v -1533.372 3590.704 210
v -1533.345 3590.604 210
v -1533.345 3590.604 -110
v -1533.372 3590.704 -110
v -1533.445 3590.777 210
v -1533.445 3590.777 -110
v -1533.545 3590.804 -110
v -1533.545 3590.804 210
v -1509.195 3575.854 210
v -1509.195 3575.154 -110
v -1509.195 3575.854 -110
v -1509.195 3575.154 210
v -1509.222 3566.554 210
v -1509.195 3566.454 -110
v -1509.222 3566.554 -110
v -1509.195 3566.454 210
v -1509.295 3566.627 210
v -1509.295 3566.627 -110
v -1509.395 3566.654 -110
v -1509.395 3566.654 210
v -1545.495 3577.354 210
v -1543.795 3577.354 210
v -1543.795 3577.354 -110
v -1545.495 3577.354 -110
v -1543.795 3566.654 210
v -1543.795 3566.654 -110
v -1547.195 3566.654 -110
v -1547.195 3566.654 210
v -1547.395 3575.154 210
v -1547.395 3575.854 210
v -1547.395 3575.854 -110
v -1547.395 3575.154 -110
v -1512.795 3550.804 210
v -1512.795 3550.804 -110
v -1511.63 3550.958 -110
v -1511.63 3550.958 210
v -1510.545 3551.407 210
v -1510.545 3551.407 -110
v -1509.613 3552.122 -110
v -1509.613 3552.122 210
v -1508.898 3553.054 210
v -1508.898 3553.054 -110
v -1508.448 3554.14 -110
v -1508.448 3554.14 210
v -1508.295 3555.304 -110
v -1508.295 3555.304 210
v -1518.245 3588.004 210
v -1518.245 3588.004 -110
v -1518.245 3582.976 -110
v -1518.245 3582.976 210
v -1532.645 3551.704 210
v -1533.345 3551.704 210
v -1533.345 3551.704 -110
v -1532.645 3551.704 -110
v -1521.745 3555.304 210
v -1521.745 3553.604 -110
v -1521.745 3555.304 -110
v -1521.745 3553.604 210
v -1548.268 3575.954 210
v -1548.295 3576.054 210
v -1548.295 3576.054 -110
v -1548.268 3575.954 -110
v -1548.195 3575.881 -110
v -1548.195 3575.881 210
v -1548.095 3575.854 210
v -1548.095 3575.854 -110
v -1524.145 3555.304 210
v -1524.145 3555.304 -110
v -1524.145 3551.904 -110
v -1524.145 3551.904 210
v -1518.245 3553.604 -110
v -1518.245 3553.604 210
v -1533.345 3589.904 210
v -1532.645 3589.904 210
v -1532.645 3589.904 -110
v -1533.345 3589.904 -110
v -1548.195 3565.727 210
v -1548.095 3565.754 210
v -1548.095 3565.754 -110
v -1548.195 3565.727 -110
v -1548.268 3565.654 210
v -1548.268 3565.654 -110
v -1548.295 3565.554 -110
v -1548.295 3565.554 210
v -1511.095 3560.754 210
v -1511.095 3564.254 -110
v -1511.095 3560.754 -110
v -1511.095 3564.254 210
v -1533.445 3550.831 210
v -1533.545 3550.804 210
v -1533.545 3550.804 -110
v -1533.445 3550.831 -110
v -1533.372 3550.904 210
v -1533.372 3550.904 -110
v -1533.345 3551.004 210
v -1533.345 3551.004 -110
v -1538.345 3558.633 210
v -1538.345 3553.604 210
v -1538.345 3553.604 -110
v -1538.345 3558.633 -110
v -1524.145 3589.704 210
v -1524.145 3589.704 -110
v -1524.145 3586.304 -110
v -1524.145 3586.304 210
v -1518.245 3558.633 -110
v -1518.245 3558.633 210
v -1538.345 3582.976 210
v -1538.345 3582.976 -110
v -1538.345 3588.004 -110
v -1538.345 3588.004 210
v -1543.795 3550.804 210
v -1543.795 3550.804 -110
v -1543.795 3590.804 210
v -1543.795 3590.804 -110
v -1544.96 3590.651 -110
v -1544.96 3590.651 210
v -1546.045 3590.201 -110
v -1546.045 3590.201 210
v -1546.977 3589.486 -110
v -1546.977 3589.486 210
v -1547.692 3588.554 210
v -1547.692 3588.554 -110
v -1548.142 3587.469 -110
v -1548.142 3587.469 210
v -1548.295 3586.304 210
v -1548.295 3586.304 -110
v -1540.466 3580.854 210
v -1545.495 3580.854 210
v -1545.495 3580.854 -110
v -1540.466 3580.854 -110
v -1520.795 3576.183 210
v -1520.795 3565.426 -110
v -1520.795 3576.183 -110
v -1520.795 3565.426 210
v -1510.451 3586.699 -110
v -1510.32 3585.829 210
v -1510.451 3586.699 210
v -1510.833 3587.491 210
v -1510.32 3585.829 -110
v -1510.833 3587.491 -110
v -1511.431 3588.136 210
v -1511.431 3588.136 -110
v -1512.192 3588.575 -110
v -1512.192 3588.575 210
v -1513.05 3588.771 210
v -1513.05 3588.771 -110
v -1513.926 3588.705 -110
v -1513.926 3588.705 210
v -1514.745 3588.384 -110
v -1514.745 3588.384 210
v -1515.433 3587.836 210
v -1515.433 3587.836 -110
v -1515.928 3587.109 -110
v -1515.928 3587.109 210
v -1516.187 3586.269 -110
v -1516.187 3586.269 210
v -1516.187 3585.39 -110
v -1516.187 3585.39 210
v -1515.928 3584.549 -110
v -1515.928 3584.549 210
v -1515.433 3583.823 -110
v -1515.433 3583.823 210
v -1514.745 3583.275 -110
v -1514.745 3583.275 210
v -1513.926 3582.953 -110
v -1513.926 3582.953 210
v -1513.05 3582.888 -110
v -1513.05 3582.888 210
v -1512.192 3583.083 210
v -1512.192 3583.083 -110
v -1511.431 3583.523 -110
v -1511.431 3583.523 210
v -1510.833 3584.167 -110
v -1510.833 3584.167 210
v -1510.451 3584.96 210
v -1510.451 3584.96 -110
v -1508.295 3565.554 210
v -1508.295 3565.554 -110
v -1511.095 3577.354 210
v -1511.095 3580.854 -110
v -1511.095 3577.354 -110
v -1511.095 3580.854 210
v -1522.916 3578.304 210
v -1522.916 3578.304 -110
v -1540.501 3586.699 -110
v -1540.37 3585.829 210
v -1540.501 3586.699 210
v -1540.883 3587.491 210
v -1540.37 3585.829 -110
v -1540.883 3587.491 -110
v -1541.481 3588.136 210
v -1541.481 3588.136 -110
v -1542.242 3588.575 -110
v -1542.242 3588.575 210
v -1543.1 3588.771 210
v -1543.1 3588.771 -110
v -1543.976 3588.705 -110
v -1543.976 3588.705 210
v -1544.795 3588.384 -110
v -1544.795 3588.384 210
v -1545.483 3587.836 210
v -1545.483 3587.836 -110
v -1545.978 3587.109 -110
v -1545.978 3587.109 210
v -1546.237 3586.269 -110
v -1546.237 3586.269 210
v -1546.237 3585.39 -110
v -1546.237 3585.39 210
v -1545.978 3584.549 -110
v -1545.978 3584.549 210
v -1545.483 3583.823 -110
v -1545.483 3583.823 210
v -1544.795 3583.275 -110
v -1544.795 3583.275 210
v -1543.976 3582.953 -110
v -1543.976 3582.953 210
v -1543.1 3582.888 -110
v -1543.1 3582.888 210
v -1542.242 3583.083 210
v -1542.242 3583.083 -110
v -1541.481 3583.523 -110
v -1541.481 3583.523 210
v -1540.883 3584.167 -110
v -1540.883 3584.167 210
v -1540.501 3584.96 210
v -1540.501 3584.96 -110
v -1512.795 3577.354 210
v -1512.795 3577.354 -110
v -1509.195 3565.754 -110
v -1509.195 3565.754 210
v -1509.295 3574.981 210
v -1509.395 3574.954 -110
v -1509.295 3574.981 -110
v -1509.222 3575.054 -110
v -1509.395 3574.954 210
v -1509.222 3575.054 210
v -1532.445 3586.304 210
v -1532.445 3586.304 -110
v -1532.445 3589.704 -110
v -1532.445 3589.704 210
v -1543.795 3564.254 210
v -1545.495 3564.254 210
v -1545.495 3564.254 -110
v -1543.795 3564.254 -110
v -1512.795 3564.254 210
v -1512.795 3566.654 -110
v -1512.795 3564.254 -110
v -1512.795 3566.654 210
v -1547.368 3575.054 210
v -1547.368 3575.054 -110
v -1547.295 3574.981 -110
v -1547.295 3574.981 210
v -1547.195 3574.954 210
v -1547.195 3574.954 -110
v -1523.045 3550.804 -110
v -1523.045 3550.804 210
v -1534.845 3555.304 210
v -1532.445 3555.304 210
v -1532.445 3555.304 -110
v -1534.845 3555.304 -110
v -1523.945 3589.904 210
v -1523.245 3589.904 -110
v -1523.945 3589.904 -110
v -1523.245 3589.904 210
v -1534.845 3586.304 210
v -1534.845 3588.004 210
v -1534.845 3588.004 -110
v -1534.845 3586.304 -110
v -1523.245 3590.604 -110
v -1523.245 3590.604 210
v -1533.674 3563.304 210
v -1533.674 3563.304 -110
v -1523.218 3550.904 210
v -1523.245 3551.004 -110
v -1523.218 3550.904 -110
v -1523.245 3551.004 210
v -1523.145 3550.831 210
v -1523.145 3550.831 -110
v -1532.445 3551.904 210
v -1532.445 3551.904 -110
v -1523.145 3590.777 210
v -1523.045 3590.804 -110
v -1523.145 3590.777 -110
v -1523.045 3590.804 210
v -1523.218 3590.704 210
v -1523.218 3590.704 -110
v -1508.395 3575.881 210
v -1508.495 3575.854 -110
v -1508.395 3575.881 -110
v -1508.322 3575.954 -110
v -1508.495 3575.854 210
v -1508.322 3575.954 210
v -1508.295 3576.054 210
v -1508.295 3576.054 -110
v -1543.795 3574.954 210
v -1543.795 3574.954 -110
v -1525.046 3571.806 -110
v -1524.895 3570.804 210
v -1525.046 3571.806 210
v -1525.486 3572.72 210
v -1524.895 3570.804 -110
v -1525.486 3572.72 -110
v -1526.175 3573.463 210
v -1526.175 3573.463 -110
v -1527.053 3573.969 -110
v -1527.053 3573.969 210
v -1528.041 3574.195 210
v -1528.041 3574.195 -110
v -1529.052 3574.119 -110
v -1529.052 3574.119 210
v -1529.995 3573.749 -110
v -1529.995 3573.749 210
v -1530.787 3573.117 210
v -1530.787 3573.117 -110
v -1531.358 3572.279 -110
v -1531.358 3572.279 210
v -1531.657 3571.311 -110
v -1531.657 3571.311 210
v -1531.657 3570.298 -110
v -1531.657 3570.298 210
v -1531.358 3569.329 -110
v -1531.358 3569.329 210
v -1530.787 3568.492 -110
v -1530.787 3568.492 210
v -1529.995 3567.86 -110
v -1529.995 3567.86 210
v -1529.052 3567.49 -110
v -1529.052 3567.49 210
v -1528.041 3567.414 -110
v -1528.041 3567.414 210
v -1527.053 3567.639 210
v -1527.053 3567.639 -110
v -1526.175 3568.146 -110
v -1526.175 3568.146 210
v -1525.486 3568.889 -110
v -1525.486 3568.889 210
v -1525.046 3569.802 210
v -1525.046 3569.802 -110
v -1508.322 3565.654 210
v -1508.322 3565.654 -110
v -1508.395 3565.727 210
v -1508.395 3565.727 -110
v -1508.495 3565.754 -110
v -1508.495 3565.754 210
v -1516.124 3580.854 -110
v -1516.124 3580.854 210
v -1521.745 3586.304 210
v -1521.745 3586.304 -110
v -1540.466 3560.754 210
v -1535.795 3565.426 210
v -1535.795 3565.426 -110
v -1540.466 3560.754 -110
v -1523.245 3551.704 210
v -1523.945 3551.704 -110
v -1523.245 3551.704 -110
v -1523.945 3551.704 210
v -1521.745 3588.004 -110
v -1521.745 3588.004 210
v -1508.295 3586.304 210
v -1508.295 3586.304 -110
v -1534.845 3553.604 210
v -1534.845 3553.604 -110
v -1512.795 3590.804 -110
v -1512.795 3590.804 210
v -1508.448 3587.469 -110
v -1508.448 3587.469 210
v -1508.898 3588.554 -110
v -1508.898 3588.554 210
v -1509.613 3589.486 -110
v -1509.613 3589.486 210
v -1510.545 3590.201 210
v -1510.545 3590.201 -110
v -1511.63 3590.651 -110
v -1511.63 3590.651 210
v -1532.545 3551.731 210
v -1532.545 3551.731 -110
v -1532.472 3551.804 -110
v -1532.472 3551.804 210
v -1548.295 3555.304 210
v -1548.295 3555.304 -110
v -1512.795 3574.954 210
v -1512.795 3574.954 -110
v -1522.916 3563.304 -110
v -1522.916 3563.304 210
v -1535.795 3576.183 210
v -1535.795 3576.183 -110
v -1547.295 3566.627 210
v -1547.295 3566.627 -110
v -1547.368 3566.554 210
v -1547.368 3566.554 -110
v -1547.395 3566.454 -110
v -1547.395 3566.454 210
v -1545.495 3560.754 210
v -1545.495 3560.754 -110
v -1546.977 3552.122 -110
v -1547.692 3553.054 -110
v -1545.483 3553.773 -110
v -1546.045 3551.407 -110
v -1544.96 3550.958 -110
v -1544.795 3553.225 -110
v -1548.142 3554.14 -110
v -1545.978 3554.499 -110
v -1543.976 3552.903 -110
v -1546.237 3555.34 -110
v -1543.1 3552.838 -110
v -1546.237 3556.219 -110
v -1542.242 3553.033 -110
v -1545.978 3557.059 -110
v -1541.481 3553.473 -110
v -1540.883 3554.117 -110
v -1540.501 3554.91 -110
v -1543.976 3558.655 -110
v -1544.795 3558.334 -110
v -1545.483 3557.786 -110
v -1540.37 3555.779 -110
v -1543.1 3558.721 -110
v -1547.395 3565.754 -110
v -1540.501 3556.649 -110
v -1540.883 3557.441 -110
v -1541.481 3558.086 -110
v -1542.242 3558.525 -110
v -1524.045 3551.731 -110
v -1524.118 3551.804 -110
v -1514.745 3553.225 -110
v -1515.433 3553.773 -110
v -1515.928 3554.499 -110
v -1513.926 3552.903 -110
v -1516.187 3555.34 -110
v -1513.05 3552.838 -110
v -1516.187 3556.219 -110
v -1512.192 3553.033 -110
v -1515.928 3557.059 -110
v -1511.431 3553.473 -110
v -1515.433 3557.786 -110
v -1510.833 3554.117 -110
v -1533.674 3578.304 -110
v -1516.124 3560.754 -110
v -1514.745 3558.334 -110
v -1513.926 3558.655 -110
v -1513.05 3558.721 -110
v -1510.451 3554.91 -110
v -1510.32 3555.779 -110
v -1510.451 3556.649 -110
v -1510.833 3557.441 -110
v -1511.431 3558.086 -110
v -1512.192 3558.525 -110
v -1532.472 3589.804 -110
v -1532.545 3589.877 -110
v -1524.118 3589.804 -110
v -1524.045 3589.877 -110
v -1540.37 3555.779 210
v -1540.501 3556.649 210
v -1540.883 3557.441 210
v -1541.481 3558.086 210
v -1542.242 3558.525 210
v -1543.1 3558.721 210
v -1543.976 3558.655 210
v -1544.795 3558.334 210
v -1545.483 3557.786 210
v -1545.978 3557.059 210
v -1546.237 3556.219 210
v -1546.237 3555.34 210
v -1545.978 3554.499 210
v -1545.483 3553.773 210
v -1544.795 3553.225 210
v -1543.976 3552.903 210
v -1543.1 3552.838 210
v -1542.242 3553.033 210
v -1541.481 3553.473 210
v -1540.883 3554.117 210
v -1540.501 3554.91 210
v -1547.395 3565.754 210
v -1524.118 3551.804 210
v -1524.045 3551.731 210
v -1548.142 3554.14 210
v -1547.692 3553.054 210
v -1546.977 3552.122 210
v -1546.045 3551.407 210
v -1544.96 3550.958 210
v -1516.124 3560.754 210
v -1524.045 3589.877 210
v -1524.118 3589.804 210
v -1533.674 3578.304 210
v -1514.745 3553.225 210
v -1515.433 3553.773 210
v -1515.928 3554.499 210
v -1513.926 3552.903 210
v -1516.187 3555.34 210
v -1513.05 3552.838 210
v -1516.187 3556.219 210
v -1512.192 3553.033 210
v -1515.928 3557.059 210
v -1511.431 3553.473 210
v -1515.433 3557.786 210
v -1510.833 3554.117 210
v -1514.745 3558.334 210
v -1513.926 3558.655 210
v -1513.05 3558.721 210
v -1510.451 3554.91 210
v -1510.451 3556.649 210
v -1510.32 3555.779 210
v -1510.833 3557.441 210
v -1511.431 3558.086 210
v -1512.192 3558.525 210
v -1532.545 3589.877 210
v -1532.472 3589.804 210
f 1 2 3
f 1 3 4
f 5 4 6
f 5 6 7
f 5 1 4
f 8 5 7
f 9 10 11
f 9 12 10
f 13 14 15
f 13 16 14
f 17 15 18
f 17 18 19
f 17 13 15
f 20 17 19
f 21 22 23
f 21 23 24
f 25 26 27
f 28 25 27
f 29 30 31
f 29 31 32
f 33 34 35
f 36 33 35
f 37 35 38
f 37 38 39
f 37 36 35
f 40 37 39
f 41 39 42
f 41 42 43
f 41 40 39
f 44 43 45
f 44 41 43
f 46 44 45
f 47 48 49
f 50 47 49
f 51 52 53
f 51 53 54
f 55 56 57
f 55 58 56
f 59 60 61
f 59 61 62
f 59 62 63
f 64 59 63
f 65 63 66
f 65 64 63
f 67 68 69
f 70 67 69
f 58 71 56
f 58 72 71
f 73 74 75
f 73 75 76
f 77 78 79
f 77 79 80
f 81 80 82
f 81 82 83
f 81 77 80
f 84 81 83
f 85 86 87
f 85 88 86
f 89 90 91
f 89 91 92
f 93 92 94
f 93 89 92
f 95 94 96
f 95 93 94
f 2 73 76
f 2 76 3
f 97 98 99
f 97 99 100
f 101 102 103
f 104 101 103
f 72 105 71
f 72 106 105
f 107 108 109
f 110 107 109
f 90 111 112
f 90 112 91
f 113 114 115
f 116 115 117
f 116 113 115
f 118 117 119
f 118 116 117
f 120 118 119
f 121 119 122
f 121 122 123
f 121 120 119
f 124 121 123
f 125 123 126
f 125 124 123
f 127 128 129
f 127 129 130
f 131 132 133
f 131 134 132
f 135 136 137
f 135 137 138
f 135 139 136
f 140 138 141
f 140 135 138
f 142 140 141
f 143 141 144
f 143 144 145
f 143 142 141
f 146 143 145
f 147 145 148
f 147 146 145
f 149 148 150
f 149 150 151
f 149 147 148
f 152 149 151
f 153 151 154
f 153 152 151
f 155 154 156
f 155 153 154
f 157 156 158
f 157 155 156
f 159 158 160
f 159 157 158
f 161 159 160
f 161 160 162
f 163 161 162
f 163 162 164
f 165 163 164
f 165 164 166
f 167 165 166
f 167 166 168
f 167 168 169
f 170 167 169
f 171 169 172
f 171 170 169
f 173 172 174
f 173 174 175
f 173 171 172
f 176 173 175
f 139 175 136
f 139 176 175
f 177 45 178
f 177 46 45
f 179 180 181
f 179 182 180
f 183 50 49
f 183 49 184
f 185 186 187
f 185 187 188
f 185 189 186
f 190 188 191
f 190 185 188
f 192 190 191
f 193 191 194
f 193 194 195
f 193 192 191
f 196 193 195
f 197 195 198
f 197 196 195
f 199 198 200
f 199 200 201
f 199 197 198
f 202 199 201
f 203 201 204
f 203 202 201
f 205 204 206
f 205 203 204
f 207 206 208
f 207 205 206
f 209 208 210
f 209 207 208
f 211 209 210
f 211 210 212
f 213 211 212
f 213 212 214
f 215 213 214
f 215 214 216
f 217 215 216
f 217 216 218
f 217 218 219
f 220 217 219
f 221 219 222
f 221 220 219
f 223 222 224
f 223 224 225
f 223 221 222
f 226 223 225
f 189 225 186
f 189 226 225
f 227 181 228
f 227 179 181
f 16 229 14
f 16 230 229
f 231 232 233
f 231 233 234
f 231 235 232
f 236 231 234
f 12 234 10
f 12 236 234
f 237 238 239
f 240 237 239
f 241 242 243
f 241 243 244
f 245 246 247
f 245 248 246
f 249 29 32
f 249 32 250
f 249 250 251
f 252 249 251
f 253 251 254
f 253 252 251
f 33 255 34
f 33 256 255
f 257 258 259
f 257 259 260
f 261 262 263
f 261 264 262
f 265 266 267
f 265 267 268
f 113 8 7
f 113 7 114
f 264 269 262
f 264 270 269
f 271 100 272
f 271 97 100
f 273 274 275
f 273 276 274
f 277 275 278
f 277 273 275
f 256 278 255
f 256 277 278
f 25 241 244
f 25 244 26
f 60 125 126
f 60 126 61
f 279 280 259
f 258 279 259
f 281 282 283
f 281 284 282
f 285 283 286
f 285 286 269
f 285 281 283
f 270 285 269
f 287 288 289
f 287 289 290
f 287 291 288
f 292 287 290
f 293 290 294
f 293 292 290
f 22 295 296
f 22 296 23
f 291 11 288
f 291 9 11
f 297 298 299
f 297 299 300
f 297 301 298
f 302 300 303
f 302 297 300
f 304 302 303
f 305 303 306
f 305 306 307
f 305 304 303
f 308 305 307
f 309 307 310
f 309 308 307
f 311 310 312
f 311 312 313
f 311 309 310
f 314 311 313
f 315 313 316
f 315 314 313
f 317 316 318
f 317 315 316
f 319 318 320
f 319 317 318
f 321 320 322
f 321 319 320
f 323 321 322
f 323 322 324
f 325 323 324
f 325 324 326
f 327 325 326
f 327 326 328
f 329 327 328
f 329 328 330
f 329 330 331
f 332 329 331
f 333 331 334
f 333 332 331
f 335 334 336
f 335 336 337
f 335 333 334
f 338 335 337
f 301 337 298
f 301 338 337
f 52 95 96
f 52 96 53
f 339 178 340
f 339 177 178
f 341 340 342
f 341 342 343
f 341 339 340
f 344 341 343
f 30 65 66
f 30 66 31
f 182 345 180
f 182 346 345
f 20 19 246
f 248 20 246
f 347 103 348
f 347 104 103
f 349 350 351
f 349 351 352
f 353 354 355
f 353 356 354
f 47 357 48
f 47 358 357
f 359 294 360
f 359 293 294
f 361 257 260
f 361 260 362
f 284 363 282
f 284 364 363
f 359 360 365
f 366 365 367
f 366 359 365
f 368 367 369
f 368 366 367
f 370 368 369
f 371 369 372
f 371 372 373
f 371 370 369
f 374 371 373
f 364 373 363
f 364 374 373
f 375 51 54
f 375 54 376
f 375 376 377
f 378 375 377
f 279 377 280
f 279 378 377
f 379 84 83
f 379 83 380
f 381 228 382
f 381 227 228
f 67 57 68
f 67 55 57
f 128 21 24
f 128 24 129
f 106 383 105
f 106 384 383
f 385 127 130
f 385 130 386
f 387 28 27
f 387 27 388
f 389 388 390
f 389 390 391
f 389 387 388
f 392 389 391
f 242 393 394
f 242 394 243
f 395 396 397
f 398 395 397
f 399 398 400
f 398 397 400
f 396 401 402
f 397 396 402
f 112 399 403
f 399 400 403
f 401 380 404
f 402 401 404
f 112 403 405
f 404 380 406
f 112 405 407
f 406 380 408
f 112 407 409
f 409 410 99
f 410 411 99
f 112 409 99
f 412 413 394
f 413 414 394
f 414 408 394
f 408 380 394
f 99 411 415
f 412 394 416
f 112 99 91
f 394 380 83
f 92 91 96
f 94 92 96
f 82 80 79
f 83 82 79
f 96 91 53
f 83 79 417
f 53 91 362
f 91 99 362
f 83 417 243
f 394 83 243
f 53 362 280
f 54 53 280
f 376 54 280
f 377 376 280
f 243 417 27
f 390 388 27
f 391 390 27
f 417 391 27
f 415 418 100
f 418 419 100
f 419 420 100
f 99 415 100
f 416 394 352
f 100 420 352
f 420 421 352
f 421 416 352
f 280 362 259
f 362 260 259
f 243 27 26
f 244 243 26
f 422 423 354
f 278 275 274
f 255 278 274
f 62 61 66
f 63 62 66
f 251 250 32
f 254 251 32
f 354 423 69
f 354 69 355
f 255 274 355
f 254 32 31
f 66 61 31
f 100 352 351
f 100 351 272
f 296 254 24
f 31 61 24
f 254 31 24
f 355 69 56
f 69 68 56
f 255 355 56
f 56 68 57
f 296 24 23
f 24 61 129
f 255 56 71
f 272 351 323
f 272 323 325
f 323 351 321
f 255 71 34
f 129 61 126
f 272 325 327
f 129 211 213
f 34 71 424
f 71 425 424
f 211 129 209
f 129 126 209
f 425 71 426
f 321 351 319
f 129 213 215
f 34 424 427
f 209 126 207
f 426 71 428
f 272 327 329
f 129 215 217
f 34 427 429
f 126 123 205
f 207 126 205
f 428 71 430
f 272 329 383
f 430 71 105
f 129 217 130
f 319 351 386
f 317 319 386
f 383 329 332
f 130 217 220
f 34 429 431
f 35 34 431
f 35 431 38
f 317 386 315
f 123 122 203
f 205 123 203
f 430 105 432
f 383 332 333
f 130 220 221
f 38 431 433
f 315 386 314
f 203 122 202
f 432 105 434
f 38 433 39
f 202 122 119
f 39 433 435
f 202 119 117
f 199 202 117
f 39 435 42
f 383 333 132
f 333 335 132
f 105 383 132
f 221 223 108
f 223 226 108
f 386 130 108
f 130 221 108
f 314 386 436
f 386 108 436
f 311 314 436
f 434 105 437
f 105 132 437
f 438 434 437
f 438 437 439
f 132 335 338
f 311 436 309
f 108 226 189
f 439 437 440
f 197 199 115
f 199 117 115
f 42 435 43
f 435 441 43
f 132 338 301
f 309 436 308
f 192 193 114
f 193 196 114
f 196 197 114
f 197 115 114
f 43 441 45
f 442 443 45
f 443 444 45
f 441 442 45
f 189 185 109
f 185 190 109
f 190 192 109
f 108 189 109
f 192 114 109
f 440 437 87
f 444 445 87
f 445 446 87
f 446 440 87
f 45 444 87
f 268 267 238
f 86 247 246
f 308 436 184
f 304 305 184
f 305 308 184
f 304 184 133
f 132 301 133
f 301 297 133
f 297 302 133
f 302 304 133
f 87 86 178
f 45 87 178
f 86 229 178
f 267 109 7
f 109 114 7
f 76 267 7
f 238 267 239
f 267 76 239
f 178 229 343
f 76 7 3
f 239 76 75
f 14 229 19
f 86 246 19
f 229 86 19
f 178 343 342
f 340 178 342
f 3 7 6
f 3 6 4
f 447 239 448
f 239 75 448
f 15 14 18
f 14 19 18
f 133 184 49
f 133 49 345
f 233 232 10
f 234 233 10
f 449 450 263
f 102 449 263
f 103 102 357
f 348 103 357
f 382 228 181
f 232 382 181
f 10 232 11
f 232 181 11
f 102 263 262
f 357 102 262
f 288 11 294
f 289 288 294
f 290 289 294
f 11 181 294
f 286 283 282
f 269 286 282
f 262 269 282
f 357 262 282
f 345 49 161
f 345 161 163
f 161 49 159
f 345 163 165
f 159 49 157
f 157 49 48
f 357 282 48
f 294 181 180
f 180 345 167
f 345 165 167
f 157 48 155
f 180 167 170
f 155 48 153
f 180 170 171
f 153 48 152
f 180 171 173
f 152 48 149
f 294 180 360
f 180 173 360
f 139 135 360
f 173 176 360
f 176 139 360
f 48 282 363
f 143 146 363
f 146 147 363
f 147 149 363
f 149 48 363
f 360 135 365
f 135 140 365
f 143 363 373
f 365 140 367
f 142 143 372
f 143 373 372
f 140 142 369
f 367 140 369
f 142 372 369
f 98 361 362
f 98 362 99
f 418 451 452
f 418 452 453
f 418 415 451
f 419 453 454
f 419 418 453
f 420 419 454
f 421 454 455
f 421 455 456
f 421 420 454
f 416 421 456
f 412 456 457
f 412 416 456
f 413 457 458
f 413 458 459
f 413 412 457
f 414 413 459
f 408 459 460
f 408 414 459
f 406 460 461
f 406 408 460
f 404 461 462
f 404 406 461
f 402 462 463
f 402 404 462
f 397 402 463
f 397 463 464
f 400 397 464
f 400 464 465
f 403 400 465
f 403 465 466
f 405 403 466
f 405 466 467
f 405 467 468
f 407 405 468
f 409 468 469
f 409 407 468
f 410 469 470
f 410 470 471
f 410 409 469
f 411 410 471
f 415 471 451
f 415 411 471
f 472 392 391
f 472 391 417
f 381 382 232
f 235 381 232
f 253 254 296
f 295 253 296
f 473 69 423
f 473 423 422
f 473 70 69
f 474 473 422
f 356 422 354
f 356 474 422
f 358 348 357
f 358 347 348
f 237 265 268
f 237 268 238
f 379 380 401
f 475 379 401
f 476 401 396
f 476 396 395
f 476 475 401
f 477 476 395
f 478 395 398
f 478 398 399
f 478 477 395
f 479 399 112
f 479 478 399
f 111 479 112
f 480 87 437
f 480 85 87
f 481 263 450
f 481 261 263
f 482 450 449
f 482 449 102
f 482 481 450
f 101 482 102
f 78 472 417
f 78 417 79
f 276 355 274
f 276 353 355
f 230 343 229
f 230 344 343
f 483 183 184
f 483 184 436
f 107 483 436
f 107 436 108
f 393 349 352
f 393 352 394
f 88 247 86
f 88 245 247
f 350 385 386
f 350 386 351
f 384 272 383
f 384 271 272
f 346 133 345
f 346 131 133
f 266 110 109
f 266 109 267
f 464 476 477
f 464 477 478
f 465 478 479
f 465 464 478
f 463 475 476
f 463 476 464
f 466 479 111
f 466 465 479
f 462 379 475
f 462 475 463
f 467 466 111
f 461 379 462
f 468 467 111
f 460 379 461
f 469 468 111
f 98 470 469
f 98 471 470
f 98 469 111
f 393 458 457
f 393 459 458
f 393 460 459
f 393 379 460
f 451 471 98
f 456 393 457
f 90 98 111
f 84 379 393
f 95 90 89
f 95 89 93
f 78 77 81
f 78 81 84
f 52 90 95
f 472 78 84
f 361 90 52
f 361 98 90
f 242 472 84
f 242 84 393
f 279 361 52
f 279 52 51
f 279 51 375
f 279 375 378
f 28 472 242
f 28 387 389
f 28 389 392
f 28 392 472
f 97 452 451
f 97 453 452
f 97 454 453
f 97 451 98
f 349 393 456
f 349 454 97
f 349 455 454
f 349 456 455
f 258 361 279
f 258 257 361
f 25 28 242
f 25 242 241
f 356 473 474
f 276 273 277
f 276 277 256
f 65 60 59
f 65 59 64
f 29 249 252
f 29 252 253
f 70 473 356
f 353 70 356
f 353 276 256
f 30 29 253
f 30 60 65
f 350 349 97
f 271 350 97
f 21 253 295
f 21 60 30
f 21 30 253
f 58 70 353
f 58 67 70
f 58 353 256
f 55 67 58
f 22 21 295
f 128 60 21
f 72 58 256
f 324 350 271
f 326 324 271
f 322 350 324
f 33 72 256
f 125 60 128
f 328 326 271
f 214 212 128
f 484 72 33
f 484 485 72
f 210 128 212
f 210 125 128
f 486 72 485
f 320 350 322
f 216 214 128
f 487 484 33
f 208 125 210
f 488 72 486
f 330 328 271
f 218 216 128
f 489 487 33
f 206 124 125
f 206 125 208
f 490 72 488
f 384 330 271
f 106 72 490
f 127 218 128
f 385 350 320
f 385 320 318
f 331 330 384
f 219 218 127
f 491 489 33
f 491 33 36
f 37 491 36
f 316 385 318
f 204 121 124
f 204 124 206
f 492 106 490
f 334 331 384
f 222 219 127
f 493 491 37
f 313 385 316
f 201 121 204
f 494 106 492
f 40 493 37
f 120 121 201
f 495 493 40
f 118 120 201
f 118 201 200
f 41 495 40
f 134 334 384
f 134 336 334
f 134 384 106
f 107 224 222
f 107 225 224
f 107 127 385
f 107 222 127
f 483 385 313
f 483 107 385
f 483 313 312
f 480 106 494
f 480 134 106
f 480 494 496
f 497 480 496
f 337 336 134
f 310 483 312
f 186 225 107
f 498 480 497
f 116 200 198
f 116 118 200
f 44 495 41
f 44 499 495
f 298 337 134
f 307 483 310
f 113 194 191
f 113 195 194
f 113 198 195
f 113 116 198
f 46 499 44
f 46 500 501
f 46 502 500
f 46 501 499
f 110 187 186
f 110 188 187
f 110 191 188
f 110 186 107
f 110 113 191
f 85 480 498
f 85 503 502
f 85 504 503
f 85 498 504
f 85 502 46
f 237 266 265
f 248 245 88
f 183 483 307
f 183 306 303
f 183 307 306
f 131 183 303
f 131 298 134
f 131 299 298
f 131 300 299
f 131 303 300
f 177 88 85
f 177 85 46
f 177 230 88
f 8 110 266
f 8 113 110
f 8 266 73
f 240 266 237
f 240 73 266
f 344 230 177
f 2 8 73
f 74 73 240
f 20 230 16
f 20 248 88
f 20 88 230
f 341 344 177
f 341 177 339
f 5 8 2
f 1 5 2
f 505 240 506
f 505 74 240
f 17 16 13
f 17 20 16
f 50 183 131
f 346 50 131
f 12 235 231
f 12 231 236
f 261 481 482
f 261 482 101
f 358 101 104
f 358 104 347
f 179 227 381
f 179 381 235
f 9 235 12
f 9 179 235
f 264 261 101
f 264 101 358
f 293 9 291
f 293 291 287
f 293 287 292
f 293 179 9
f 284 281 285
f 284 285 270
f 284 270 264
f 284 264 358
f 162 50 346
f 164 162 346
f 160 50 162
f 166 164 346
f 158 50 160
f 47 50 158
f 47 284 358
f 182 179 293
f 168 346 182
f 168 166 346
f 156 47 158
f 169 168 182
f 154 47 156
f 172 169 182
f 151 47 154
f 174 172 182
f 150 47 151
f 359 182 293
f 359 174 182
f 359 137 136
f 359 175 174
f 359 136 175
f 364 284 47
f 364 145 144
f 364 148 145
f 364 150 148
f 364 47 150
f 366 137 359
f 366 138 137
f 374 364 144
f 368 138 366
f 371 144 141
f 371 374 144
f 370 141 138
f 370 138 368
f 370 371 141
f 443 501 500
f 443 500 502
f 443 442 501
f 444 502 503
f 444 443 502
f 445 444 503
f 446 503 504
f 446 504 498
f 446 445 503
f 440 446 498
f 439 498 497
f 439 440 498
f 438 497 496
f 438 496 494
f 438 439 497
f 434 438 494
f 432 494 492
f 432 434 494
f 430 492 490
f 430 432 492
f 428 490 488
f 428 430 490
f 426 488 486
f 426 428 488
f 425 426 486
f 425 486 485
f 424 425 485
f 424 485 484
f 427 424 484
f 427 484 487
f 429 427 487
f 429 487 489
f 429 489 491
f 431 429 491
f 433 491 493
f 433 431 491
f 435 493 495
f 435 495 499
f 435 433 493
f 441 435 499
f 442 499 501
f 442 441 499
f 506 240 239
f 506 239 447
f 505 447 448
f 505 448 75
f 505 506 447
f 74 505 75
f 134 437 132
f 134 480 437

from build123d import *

# Parameters (mm, degrees)
SKETCH_1_R      = 2.95
SKETCH_1_R_2    = 3.4
EXTRUDE_1_DEPTH = 160


with BuildPart() as part:
    # 草图1 → 凸台-拉伸1 (new body, symmetric)
    with BuildSketch(Plane.XY.offset(50)):
        with BuildLine():
            Line((-1518.245004392, 3588.004280474), (-1518.245004392, 3582.975600817))
            Line((-1518.245004392, 3582.975600817), (-1522.916324736, 3578.304280474))
            Line((-1522.916324736, 3578.304280474), (-1533.673684048, 3578.304280474))
            Line((-1533.673684048, 3578.304280474), (-1538.345004392, 3582.975600817))
            Line((-1538.345004392, 3582.975600817), (-1538.345004392, 3588.004280474))
            Line((-1538.345004392, 3588.004280474), (-1534.845004392, 3588.004280474))
            Line((-1534.845004392, 3588.004280474), (-1534.845004392, 3586.304280474))
            Line((-1534.845004392, 3586.304280474), (-1532.445004392, 3586.304280474))
            Line((-1532.445004392, 3586.304280474), (-1532.445004392, 3589.704280474))
            ThreePointArc((-1532.445004392, 3589.704280474), (-1532.503583036, 3589.84570183), (-1532.645004392, 3589.904280474))
            Line((-1532.645004392, 3589.904280474), (-1533.345004392, 3589.904280474))
            Line((-1533.345004392, 3589.904280474), (-1533.345004392, 3590.604280474))
            ThreePointArc((-1533.345004392, 3590.604280474), (-1533.403583036, 3590.74570183), (-1533.545004392, 3590.804280474))
            Line((-1533.545004392, 3590.804280474), (-1543.795004392, 3590.804280474))
            ThreePointArc((-1543.795004392, 3590.804280474), (-1546.976984907, 3589.486260989), (-1548.295004392, 3586.304280474))
            Line((-1548.295004392, 3586.304280474), (-1548.295004392, 3576.054280474))
            ThreePointArc((-1548.295004392, 3576.054280474), (-1548.236425748, 3575.912859117), (-1548.095004392, 3575.854280474))
            Line((-1548.095004392, 3575.854280474), (-1547.395004392, 3575.854280474))
            Line((-1547.395004392, 3575.854280474), (-1547.395004392, 3575.154280474))
            ThreePointArc((-1547.395004392, 3575.154280474), (-1547.336425748, 3575.012859117), (-1547.195004392, 3574.954280474))
            Line((-1547.195004392, 3574.954280474), (-1543.795004392, 3574.954280474))
            Line((-1543.795004392, 3574.954280474), (-1543.795004392, 3577.354280474))
            Line((-1543.795004392, 3577.354280474), (-1545.495004392, 3577.354280474))
            Line((-1545.495004392, 3577.354280474), (-1545.495004392, 3580.854280474))
            Line((-1545.495004392, 3580.854280474), (-1540.466324736, 3580.854280474))
            Line((-1540.466324736, 3580.854280474), (-1535.795004392, 3576.18296013))
            Line((-1535.795004392, 3576.18296013), (-1535.795004392, 3565.425600817))
            Line((-1535.795004392, 3565.425600817), (-1540.466324736, 3560.754280474))
            Line((-1540.466324736, 3560.754280474), (-1545.495004392, 3560.754280474))
            Line((-1545.495004392, 3560.754280474), (-1545.495004392, 3564.254280474))
            Line((-1545.495004392, 3564.254280474), (-1543.795004392, 3564.254280474))
            Line((-1543.795004392, 3564.254280474), (-1543.795004392, 3566.654280474))
            Line((-1543.795004392, 3566.654280474), (-1547.195004392, 3566.654280474))
            ThreePointArc((-1547.195004392, 3566.654280474), (-1547.336425748, 3566.59570183), (-1547.395004392, 3566.454280474))
            Line((-1547.395004392, 3566.454280474), (-1547.395004392, 3565.754280474))
            Line((-1547.395004392, 3565.754280474), (-1548.095004392, 3565.754280474))
            ThreePointArc((-1548.095004392, 3565.754280474), (-1548.236425748, 3565.69570183), (-1548.295004392, 3565.554280474))
            Line((-1548.295004392, 3565.554280474), (-1548.295004392, 3555.304280474))
            ThreePointArc((-1548.295004392, 3555.304280474), (-1546.976984907, 3552.122299958), (-1543.795004392, 3550.804280474))
            Line((-1543.795004392, 3550.804280474), (-1533.545004392, 3550.804280474))
            ThreePointArc((-1533.545004392, 3550.804280474), (-1533.403583036, 3550.862859117), (-1533.345004392, 3551.004280474))
            Line((-1533.345004392, 3551.004280474), (-1533.345004392, 3551.704280474))
            Line((-1533.345004392, 3551.704280474), (-1532.645004392, 3551.704280474))
            ThreePointArc((-1532.645004392, 3551.704280474), (-1532.503583036, 3551.762859117), (-1532.445004392, 3551.904280474))
            Line((-1532.445004392, 3551.904280474), (-1532.445004392, 3555.304280474))
            Line((-1532.445004392, 3555.304280474), (-1534.845004392, 3555.304280474))
            Line((-1534.845004392, 3555.304280474), (-1534.845004392, 3553.604280474))
            Line((-1534.845004392, 3553.604280474), (-1538.345004392, 3553.604280474))
            Line((-1538.345004392, 3553.604280474), (-1538.345004392, 3558.63296013))
            Line((-1538.345004392, 3558.63296013), (-1533.673684048, 3563.304280474))
            Line((-1533.673684048, 3563.304280474), (-1522.916324736, 3563.304280474))
            Line((-1522.916324736, 3563.304280474), (-1518.245004392, 3558.63296013))
            Line((-1518.245004392, 3558.63296013), (-1518.245004392, 3553.604280474))
            Line((-1518.245004392, 3553.604280474), (-1521.745004392, 3553.604280474))
            Line((-1521.745004392, 3553.604280474), (-1521.745004392, 3555.304280474))
            Line((-1521.745004392, 3555.304280474), (-1524.145004392, 3555.304280474))
            Line((-1524.145004392, 3555.304280474), (-1524.145004392, 3551.904280474))
            ThreePointArc((-1524.145004392, 3551.904280474), (-1524.086425748, 3551.762859117), (-1523.945004392, 3551.704280474))
            Line((-1523.945004392, 3551.704280474), (-1523.245004392, 3551.704280474))
            Line((-1523.245004392, 3551.704280474), (-1523.245004392, 3551.004280474))
            ThreePointArc((-1523.245004392, 3551.004280474), (-1523.186425748, 3550.862859117), (-1523.045004392, 3550.804280474))
            Line((-1523.045004392, 3550.804280474), (-1512.795004392, 3550.804280474))
            ThreePointArc((-1512.795004392, 3550.804280474), (-1509.613023877, 3552.122299958), (-1508.295004392, 3555.304280474))
            Line((-1508.295004392, 3555.304280474), (-1508.295004392, 3565.554280474))
            ThreePointArc((-1508.295004392, 3565.554280474), (-1508.353583036, 3565.69570183), (-1508.495004392, 3565.754280474))
            Line((-1508.495004392, 3565.754280474), (-1509.195004392, 3565.754280474))
            Line((-1509.195004392, 3565.754280474), (-1509.195004392, 3566.454280474))
            ThreePointArc((-1509.195004392, 3566.454280474), (-1509.253583036, 3566.59570183), (-1509.395004392, 3566.654280474))
            Line((-1509.395004392, 3566.654280474), (-1512.795004392, 3566.654280474))
            Line((-1512.795004392, 3566.654280474), (-1512.795004392, 3564.254280474))
            Line((-1512.795004392, 3564.254280474), (-1511.095004392, 3564.254280474))
            Line((-1511.095004392, 3564.254280474), (-1511.095004392, 3560.754280474))
            Line((-1511.095004392, 3560.754280474), (-1516.123684048, 3560.754280474))
            Line((-1516.123684048, 3560.754280474), (-1520.795004392, 3565.425600817))
            Line((-1520.795004392, 3565.425600817), (-1520.795004392, 3576.18296013))
            Line((-1520.795004392, 3576.18296013), (-1516.123684048, 3580.854280474))
            Line((-1516.123684048, 3580.854280474), (-1511.095004392, 3580.854280474))
            Line((-1511.095004392, 3580.854280474), (-1511.095004392, 3577.354280474))
            Line((-1511.095004392, 3577.354280474), (-1512.795004392, 3577.354280474))
            Line((-1512.795004392, 3577.354280474), (-1512.795004392, 3574.954280474))
            Line((-1512.795004392, 3574.954280474), (-1509.395004392, 3574.954280474))
            ThreePointArc((-1509.395004392, 3574.954280474), (-1509.253583036, 3575.012859117), (-1509.195004392, 3575.154280474))
            Line((-1509.195004392, 3575.154280474), (-1509.195004392, 3575.854280474))
            Line((-1509.195004392, 3575.854280474), (-1508.495004392, 3575.854280474))
            ThreePointArc((-1508.495004392, 3575.854280474), (-1508.353583036, 3575.912859117), (-1508.295004392, 3576.054280474))
            Line((-1508.295004392, 3576.054280474), (-1508.295004392, 3586.304280474))
            ThreePointArc((-1508.295004392, 3586.304280474), (-1509.613023877, 3589.486260989), (-1512.795004392, 3590.804280474))
            Line((-1512.795004392, 3590.804280474), (-1523.045004392, 3590.804280474))
            ThreePointArc((-1523.045004392, 3590.804280474), (-1523.186425748, 3590.74570183), (-1523.245004392, 3590.604280474))
            Line((-1523.245004392, 3590.604280474), (-1523.245004392, 3589.904280474))
            Line((-1523.245004392, 3589.904280474), (-1523.945004392, 3589.904280474))
            ThreePointArc((-1523.945004392, 3589.904280474), (-1524.086425748, 3589.84570183), (-1524.145004392, 3589.704280474))
            Line((-1524.145004392, 3589.704280474), (-1524.145004392, 3586.304280474))
            Line((-1524.145004392, 3586.304280474), (-1521.745004392, 3586.304280474))
            Line((-1521.745004392, 3586.304280474), (-1521.745004392, 3588.004280474))
            Line((-1521.745004392, 3588.004280474), (-1518.245004392, 3588.004280474))
        make_face()
        with Locations((-1513.270004392, 3555.779280474)):
            Circle(SKETCH_1_R, mode=Mode.SUBTRACT)
        with Locations((-1528.295004392, 3570.804280474)):
            Circle(SKETCH_1_R_2, mode=Mode.SUBTRACT)
        with Locations((-1513.270004392, 3585.829280474)):
            Circle(SKETCH_1_R, mode=Mode.SUBTRACT)
        with Locations((-1543.320004392, 3585.829280474)):
            Circle(SKETCH_1_R, mode=Mode.SUBTRACT)
        with Locations((-1543.320004392, 3555.779280474)):
            Circle(SKETCH_1_R, mode=Mode.SUBTRACT)
    extrude(amount=EXTRUDE_1_DEPTH, both=True)


solid = part.part
